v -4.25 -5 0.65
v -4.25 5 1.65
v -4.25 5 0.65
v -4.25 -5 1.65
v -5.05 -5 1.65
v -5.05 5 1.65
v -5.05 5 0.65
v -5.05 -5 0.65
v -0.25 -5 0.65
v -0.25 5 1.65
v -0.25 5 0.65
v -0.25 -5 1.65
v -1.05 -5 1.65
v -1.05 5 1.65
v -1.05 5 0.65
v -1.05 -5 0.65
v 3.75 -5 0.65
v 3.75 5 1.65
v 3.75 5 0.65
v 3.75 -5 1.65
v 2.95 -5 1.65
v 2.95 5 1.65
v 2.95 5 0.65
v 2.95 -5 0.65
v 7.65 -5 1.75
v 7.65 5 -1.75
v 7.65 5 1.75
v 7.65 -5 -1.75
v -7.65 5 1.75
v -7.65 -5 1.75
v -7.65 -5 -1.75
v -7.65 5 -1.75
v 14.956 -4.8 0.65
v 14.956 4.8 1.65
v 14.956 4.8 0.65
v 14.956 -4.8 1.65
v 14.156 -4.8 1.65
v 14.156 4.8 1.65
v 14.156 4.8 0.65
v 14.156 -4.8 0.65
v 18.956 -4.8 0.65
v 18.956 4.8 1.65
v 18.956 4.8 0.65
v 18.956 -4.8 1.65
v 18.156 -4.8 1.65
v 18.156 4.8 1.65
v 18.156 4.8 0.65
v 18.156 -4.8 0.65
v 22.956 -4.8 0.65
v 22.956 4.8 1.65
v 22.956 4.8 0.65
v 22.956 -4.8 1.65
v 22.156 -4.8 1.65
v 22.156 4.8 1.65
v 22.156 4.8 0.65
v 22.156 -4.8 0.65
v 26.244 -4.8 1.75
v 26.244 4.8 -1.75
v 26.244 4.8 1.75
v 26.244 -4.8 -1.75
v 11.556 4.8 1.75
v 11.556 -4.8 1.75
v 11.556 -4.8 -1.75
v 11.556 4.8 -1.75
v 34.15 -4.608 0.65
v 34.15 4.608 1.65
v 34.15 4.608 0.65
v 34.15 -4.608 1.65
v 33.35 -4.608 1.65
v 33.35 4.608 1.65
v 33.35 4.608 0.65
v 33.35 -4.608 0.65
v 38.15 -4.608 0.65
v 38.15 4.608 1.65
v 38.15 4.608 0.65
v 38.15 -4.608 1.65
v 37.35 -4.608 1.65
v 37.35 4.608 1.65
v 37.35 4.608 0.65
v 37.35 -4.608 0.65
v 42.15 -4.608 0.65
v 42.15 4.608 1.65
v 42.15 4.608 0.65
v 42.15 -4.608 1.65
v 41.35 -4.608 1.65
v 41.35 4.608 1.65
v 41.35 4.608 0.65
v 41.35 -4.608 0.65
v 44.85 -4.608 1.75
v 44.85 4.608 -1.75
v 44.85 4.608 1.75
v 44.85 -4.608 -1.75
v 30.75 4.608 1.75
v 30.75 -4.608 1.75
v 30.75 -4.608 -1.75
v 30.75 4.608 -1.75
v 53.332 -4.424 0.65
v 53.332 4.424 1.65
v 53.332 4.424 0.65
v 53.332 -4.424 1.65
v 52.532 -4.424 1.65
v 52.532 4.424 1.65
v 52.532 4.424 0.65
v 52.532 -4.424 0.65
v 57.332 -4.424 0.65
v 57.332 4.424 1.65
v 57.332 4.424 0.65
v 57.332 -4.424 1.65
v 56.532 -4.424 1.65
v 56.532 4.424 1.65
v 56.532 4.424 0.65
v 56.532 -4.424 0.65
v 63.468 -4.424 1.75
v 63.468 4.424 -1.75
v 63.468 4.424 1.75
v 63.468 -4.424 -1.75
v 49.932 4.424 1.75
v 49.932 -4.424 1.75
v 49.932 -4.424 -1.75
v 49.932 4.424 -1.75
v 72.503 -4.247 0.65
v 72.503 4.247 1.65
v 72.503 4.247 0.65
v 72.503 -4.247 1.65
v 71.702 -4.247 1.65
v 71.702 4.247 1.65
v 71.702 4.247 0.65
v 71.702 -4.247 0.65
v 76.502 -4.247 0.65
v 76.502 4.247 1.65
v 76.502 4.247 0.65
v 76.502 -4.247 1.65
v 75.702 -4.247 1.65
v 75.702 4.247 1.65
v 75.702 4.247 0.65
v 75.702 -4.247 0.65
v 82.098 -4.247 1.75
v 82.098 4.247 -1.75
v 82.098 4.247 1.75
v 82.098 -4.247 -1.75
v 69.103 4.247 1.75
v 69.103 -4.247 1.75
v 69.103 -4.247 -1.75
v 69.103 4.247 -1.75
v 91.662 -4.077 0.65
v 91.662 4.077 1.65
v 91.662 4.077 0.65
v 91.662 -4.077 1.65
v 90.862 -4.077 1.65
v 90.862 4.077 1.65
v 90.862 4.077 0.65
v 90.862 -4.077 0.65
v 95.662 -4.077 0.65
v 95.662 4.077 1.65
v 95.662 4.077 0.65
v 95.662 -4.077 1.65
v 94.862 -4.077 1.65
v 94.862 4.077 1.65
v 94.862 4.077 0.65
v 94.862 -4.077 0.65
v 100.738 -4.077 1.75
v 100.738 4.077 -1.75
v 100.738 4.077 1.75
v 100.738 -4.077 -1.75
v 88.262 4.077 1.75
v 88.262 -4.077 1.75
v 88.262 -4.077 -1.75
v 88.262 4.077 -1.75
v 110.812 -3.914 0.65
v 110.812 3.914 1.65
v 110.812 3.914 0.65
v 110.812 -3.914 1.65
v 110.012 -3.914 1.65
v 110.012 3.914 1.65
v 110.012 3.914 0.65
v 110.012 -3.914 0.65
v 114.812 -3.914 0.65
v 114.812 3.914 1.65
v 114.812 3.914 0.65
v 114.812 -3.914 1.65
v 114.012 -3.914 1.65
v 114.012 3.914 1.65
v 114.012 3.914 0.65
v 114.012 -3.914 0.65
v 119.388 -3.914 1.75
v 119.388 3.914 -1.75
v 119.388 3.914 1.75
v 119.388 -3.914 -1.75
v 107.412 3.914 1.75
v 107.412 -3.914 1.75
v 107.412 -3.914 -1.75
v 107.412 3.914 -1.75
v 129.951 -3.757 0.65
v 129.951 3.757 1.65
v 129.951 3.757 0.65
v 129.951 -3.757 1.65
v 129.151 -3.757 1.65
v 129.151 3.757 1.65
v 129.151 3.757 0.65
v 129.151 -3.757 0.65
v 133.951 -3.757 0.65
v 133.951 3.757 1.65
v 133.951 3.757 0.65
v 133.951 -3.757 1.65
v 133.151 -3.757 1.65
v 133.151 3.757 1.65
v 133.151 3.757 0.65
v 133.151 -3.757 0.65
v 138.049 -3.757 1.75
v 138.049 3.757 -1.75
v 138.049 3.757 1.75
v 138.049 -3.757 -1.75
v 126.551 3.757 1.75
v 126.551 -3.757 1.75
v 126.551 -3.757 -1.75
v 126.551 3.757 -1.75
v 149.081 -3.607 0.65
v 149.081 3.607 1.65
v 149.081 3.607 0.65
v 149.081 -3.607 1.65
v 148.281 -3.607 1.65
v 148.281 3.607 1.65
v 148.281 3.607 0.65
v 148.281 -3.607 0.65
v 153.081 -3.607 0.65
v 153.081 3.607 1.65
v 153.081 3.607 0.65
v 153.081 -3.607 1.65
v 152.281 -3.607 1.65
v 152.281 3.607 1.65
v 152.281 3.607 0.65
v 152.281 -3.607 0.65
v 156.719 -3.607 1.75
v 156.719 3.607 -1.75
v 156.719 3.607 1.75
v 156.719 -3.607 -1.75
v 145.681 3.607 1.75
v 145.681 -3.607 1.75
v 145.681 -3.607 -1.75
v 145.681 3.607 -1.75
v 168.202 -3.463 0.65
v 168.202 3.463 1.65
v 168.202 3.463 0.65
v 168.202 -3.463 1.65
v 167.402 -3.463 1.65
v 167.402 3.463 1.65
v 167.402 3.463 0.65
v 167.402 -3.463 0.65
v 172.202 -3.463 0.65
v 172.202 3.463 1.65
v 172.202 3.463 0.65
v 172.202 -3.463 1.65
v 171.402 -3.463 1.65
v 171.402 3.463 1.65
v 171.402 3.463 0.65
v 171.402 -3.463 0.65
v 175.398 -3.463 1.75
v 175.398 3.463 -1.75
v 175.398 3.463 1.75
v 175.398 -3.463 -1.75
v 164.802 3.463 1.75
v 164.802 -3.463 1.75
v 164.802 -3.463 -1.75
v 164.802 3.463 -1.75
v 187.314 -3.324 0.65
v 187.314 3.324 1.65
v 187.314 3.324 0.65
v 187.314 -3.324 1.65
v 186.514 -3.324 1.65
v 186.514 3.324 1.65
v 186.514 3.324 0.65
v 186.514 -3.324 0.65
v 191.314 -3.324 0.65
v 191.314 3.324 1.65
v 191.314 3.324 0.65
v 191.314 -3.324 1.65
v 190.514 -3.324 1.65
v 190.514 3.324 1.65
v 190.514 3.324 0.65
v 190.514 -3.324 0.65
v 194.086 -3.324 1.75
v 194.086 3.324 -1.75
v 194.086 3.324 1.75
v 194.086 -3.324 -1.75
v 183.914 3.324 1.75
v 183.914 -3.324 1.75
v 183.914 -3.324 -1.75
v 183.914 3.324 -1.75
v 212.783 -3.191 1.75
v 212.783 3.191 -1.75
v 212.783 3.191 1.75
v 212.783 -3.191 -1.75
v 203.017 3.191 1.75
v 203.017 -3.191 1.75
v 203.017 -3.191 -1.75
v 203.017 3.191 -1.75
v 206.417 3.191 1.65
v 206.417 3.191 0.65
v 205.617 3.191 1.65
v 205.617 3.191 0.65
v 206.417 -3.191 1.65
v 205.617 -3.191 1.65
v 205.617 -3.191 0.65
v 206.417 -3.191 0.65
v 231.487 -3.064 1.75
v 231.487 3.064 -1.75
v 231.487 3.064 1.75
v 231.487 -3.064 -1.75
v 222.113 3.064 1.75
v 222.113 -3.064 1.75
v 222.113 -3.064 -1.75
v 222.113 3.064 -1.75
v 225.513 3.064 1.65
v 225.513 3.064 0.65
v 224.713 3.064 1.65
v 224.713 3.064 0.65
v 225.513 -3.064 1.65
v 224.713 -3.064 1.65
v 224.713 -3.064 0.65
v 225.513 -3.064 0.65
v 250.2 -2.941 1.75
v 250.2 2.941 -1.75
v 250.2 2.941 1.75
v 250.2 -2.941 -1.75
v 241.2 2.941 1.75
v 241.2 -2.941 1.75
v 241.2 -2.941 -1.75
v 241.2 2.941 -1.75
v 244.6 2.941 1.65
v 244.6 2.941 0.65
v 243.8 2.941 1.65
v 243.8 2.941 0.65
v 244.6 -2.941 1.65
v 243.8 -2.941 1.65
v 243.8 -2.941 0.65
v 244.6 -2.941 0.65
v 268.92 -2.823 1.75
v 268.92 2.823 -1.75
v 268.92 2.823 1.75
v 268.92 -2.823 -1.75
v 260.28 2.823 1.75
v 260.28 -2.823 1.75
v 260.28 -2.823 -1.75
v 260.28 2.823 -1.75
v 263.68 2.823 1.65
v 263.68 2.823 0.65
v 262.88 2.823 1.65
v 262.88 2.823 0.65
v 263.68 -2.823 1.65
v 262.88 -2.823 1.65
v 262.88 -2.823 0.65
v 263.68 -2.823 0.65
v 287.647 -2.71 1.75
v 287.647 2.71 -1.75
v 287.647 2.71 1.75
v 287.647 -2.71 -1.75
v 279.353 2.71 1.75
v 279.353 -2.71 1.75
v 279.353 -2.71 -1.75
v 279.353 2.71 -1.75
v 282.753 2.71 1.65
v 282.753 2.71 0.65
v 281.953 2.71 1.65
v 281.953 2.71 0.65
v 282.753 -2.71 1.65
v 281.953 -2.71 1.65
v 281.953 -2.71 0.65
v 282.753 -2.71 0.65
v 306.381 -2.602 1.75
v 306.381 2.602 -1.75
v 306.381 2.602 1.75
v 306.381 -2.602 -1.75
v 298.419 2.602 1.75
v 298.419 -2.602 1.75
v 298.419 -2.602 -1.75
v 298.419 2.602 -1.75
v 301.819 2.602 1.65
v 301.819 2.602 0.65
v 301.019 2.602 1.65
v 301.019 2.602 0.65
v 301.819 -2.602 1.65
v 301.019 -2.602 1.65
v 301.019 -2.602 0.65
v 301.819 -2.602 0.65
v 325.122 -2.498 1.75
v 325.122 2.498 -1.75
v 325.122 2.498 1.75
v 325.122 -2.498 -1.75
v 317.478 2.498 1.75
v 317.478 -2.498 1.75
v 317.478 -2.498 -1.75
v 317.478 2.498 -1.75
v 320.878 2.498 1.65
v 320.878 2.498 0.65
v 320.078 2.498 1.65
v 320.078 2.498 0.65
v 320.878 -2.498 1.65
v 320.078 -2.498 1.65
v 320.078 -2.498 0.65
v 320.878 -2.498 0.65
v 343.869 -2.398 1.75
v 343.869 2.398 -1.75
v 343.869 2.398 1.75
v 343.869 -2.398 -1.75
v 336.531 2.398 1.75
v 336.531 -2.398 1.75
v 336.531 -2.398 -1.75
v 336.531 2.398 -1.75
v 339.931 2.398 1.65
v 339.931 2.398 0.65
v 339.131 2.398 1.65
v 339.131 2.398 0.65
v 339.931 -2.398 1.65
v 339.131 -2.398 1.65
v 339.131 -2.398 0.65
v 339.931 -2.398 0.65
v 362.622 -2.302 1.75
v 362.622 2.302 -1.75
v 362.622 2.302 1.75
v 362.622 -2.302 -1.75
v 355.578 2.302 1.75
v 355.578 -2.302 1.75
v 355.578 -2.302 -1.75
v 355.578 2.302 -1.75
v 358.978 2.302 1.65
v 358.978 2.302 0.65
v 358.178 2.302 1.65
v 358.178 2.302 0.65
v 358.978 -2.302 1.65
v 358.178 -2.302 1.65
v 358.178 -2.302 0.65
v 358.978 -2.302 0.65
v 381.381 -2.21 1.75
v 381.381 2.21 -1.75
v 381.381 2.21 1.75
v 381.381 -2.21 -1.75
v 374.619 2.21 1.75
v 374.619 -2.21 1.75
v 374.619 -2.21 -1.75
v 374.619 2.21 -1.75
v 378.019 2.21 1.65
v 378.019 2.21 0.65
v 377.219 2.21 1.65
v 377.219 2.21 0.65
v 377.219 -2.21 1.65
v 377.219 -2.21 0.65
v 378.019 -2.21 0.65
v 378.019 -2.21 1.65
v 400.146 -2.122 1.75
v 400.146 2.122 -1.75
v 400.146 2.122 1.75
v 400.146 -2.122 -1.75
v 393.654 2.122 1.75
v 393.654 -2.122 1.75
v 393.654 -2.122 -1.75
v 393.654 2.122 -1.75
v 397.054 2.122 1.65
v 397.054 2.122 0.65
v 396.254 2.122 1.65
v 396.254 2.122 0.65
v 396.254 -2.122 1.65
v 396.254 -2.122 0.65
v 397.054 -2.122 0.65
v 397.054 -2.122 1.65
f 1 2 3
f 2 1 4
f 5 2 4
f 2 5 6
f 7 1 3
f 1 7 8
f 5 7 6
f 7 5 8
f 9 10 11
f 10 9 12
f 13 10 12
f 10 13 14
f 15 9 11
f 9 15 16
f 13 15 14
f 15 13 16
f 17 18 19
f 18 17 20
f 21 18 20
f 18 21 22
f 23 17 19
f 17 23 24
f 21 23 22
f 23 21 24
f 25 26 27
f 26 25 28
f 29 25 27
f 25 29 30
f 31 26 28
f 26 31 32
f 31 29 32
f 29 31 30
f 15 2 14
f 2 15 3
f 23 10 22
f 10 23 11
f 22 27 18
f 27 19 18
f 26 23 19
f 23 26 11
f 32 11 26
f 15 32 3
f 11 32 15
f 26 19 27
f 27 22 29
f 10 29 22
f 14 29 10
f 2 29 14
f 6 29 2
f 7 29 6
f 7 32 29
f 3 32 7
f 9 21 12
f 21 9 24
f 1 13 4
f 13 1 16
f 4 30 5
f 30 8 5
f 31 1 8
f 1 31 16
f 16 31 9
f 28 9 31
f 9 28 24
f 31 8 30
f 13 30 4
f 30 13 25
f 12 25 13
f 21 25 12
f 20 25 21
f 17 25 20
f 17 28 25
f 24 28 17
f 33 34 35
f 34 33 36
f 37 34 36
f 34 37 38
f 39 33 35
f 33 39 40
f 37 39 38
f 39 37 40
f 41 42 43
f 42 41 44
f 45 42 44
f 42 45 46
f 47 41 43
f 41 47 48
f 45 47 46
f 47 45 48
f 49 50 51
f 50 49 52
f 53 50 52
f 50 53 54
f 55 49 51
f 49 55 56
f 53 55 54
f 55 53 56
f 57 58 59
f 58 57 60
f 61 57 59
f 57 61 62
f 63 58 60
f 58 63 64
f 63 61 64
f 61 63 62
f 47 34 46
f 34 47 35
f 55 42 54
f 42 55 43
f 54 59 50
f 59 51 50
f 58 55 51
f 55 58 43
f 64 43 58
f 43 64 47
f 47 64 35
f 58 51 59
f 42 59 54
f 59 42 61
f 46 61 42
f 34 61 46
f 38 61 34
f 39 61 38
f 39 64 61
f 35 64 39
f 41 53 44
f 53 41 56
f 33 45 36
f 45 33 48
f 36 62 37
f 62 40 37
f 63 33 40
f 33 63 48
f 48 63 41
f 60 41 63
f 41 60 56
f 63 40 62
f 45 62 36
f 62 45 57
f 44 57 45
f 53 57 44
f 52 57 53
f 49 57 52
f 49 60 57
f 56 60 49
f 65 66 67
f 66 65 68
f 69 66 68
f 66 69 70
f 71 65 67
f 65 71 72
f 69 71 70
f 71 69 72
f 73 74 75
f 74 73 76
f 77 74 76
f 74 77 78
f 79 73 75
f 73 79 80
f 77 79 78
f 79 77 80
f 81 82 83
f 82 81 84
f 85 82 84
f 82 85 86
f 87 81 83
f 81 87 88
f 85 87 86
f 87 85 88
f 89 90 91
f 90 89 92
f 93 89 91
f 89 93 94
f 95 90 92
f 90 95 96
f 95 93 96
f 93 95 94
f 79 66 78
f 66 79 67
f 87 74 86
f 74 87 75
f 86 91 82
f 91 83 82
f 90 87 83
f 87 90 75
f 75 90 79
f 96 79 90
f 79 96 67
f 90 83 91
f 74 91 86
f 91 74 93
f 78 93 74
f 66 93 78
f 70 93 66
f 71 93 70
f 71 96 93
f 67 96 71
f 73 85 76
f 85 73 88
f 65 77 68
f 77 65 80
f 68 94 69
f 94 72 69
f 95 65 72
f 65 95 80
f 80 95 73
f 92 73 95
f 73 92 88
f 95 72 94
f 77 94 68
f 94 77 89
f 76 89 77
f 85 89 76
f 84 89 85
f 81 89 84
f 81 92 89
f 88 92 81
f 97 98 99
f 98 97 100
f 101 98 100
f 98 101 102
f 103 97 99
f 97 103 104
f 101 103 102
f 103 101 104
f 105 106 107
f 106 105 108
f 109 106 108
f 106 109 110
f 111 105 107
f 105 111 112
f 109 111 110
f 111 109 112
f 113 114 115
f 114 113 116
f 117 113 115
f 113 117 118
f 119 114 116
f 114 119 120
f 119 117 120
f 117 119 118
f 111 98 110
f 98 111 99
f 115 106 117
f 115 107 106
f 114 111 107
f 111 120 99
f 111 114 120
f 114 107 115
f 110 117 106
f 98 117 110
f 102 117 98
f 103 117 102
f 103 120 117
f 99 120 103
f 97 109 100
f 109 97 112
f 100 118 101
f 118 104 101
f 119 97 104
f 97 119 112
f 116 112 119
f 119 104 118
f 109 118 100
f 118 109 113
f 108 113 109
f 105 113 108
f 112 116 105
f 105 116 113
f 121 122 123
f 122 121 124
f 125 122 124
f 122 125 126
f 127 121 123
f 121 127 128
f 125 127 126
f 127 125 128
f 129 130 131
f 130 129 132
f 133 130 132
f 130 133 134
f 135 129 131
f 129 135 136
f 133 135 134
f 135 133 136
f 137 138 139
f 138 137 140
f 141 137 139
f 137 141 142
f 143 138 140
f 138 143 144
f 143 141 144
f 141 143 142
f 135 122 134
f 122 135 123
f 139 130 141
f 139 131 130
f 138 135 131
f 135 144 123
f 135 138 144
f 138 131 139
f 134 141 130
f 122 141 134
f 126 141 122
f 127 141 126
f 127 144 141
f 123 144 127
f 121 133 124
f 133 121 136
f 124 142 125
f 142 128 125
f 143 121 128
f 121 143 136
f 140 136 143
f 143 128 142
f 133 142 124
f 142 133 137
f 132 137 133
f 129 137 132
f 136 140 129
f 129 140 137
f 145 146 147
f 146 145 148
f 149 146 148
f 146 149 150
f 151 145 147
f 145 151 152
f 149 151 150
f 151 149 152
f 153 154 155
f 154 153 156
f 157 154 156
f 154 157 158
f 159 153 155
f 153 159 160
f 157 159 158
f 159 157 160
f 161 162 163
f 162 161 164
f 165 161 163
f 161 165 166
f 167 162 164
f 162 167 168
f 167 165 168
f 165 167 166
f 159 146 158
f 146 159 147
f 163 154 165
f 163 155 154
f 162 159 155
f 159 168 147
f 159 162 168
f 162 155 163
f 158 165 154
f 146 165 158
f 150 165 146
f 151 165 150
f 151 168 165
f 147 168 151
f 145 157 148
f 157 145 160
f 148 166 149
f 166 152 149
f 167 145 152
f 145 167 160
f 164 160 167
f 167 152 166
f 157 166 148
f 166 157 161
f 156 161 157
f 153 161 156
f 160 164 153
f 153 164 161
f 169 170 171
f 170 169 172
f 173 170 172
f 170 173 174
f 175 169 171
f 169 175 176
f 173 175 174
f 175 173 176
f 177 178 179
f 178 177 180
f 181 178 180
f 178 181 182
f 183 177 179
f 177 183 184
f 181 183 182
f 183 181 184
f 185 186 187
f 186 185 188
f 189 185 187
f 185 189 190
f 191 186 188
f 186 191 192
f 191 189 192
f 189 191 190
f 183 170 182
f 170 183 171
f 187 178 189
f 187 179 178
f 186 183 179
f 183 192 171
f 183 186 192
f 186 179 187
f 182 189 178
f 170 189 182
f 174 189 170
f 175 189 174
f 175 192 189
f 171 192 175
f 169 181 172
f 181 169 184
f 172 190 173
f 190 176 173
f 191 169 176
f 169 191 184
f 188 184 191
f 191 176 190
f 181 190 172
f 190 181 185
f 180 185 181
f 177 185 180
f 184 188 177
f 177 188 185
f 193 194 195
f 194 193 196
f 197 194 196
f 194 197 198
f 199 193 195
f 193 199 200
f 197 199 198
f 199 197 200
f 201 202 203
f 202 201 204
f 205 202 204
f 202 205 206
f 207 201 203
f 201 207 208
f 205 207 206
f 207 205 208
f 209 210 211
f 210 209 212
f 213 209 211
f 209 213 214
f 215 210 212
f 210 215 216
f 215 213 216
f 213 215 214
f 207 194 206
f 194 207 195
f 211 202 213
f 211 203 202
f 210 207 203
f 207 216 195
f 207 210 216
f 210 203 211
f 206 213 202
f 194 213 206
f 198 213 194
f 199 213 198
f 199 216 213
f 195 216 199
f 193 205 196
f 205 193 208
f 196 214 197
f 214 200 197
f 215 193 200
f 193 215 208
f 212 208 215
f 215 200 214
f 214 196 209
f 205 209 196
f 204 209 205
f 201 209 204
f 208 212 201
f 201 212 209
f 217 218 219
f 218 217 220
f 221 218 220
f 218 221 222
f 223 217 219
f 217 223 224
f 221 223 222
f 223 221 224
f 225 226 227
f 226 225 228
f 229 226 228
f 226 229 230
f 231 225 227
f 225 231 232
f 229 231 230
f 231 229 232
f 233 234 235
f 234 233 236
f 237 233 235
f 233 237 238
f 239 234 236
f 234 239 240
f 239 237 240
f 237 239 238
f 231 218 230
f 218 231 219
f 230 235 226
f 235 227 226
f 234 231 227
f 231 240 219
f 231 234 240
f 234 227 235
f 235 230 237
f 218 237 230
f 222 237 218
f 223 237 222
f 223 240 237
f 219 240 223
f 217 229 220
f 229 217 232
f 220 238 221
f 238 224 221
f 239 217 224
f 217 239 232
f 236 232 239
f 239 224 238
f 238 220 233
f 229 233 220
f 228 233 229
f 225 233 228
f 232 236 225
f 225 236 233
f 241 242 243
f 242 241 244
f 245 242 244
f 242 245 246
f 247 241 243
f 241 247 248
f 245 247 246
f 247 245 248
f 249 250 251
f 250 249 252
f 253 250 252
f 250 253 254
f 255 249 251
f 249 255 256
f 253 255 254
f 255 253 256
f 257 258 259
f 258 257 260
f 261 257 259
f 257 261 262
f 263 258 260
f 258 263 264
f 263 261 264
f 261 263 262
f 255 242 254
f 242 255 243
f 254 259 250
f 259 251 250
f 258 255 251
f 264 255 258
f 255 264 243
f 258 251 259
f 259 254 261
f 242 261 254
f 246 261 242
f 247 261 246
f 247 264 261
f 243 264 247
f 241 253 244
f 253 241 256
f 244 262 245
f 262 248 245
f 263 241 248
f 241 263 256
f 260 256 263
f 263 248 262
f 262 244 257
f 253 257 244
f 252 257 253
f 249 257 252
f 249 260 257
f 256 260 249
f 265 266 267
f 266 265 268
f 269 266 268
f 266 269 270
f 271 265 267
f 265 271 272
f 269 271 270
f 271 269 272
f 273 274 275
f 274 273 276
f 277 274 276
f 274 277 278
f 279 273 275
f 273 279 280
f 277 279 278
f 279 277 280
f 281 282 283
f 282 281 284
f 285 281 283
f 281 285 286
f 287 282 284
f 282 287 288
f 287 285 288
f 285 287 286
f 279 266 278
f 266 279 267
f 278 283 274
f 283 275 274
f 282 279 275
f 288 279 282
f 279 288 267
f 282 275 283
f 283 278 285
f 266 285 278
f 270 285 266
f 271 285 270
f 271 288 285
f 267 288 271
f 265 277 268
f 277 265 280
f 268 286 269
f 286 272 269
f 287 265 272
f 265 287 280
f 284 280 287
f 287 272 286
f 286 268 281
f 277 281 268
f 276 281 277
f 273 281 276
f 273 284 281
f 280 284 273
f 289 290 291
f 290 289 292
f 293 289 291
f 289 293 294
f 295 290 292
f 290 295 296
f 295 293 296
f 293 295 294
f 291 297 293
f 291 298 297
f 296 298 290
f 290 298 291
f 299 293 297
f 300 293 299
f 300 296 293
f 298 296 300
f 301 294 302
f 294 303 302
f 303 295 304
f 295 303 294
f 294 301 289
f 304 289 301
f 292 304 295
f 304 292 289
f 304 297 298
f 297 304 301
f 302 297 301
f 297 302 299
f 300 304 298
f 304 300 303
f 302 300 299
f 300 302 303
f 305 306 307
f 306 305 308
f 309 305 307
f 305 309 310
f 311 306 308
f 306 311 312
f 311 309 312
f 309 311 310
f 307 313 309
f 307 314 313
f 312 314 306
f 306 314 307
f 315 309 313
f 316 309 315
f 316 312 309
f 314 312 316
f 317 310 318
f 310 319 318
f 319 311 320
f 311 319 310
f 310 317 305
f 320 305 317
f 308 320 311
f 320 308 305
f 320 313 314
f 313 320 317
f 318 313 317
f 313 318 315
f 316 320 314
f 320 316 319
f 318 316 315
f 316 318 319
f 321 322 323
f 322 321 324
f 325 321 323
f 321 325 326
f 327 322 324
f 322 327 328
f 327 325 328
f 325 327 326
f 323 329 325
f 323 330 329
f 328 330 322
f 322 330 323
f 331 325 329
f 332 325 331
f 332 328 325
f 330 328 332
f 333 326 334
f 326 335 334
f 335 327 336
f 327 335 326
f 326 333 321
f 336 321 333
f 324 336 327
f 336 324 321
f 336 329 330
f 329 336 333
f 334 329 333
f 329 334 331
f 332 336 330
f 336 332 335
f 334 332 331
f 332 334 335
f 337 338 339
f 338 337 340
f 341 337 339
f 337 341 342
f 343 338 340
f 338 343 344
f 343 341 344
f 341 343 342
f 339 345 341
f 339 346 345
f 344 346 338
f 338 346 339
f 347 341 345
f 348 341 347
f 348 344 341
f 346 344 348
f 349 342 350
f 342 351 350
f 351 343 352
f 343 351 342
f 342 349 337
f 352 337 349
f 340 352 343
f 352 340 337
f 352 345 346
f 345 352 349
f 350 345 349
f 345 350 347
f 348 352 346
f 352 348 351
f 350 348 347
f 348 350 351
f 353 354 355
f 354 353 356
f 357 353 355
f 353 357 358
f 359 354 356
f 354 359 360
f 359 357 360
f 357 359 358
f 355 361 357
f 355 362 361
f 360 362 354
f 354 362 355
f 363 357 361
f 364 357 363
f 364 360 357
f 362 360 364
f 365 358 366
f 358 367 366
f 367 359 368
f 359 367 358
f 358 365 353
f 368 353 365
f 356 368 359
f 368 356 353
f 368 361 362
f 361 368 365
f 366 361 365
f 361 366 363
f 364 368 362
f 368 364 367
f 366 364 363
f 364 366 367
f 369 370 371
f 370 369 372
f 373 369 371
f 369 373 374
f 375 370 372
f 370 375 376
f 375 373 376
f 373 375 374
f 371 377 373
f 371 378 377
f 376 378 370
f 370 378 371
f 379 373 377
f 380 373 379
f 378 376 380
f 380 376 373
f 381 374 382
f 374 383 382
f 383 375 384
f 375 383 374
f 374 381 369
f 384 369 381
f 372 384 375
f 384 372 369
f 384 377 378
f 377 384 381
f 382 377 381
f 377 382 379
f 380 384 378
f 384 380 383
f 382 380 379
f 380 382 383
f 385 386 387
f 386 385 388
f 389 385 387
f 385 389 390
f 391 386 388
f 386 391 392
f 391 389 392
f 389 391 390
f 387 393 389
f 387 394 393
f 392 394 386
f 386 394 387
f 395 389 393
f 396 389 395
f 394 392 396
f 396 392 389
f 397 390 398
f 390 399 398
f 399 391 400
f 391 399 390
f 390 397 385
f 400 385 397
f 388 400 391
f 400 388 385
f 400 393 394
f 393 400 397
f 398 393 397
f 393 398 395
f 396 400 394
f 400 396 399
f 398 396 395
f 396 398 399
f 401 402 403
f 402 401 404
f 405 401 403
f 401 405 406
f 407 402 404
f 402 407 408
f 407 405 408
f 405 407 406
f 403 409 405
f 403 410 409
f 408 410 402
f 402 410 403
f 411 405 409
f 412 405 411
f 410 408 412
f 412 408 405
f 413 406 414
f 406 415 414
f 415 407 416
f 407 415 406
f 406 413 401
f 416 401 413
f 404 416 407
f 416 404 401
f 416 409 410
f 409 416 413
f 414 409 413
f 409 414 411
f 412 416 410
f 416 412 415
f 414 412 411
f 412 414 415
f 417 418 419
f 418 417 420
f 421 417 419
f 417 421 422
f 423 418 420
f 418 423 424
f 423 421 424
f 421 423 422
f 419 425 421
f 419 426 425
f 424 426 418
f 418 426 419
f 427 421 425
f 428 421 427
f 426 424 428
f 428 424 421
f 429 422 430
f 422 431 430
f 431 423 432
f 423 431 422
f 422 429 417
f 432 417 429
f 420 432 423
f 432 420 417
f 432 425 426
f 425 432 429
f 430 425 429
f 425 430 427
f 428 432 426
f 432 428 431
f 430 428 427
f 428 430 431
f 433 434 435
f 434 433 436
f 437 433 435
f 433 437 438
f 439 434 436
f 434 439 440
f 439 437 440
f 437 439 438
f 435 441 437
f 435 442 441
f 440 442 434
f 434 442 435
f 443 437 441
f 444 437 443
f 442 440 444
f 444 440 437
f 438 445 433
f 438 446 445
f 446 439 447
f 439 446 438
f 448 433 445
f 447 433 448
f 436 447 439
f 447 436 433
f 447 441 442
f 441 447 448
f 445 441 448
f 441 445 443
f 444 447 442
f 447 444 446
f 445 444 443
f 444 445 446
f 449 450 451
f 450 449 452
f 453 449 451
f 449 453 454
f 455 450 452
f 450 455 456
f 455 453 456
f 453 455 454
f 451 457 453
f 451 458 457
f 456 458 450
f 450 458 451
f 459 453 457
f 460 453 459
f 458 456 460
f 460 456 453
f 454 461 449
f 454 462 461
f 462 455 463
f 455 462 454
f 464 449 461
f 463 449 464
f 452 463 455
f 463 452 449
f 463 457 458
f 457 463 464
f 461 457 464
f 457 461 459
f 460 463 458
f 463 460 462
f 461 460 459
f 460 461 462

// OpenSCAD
// Flexi Snake — DUAL COLOR
// File 2/2: Belly plates (Color 2 — cream/yellow PLA)
// Snaps into belly slots of snake_dual_color_body.scad
// P2S AMS: slot 2 = cream/light filament

SEGMENTS = 22;
GAP      = 0.45;
SEG_L    = 18;
SEG_W    = 12;   // Belly width (narrower than body)
SEG_H    = 3.5;  // Belly plate height
TAPER    = 0.96;

module belly_plate(i) {
    sf = pow(TAPER, i);
    w  = (SEG_W - 2) * sf;
    l  = SEG_L * sf * 0.85;

    // Flat belly plate with segmentation lines
    difference() {
        cube([l, w, SEG_H], center = true);
        // Transverse groove lines (segmented belly look)
        for (x = [-l/2 + 3 : 4 : l/2 - 3])
            translate([x, 0, SEG_H/2 - 0.6])
                cube([0.8, w + 1, 1], center = true);
    }
}

for (i = [0 : SEGMENTS-1])
    translate([i * (SEG_L + GAP*2), 0, 0])
        belly_plate(i);
